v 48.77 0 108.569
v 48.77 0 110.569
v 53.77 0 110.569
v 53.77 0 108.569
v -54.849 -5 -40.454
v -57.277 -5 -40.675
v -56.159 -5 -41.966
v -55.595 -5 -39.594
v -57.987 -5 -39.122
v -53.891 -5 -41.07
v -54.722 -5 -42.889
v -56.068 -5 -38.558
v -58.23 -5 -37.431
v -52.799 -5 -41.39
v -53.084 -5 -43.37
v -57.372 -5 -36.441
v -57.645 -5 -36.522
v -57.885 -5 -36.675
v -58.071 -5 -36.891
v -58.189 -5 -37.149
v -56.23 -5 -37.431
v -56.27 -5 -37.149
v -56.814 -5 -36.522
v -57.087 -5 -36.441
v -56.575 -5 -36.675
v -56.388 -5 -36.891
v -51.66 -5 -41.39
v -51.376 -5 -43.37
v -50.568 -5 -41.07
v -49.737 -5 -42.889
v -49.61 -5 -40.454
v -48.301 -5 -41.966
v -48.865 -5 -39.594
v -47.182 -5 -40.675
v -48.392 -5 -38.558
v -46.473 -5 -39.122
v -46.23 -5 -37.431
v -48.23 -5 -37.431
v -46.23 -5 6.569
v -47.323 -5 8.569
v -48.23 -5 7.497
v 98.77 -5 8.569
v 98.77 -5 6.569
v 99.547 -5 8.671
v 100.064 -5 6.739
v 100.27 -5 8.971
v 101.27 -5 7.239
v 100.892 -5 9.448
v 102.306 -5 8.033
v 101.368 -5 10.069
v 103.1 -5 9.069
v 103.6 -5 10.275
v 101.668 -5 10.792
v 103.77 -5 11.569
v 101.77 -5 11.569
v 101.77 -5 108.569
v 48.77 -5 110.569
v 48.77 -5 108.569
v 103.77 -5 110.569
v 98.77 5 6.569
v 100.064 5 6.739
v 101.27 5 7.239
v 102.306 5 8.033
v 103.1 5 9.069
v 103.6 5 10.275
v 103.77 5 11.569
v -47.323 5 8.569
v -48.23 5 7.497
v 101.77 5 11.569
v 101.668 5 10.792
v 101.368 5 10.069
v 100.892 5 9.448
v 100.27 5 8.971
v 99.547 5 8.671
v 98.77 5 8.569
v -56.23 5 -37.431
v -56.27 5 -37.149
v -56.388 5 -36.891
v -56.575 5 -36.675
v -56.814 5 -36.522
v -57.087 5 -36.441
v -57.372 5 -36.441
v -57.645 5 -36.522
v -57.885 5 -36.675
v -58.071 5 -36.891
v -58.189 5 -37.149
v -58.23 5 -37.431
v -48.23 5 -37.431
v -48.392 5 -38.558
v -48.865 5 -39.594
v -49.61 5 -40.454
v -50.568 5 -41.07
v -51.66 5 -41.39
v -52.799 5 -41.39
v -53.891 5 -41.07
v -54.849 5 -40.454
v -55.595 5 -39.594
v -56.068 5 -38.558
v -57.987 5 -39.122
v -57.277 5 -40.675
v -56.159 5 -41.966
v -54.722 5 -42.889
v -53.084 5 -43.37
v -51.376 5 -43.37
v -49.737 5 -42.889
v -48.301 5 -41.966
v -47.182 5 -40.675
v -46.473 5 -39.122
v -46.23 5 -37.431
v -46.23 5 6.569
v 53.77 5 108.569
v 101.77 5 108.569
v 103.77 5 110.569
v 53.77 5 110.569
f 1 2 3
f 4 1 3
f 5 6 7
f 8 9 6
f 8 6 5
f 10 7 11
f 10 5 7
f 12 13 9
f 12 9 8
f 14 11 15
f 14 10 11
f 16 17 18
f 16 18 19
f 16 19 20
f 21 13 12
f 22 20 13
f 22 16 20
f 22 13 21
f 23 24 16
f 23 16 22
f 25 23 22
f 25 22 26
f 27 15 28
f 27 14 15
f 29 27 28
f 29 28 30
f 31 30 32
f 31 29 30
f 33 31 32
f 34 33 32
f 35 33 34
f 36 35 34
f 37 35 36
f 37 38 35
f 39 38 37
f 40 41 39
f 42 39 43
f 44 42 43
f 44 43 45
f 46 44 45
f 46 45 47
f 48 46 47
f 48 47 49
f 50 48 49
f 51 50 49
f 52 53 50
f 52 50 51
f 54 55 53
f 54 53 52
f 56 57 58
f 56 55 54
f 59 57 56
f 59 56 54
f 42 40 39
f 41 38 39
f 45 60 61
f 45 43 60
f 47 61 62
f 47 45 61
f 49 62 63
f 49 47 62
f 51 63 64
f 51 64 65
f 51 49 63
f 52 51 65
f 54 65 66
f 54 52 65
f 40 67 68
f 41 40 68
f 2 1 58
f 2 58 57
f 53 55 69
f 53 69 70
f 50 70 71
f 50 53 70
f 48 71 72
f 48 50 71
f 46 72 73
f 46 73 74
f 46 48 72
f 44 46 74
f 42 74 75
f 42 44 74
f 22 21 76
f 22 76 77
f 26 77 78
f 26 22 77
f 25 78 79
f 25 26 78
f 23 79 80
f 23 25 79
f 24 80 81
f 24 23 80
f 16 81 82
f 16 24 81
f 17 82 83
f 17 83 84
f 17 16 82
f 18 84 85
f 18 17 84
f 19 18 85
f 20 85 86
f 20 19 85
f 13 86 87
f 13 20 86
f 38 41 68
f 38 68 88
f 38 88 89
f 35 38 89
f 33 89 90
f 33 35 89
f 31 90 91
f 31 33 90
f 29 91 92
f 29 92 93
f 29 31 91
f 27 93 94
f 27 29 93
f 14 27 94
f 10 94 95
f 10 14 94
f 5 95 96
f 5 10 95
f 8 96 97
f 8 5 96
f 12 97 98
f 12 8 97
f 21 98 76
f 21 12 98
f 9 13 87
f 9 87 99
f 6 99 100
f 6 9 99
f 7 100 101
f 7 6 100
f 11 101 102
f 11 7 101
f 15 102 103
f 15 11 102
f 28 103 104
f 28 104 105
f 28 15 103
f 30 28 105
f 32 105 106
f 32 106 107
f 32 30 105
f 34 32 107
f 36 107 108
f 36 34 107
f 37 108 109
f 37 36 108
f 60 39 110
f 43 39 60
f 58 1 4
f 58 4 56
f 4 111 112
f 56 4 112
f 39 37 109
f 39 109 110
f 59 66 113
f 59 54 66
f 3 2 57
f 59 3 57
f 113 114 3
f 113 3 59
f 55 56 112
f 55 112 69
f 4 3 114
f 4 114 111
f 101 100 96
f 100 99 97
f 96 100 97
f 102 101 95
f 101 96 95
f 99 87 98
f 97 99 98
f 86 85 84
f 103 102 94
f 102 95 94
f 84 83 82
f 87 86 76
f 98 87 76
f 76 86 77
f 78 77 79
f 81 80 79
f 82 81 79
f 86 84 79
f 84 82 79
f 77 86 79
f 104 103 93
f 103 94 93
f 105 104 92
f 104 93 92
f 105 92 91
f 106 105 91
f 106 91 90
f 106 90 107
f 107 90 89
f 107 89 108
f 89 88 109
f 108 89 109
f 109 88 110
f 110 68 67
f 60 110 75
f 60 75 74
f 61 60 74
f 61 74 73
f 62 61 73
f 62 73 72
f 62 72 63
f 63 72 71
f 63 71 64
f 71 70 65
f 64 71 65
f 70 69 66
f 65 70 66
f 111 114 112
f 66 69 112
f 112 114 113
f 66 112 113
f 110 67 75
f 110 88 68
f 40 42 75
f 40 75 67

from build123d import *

# Parameters (mm, degrees)
F1_DEPTH = 5
F0_W     = 5
F0_H     = 2
F2_DEPTH = 5


# Not quite as in the source:
# - ends of sketch curves that miss each other by under 0.0002 mm in the source are joined


with BuildPart() as f1:
    # F0 (on Front) → F1 (new body, symmetric)
    with BuildSketch(Plane.XZ):
        with BuildLine():
            Line((103.7702985108, 110.5688567758), (53.7702985108, 110.5688567758))
            Line((53.7702985108, 110.5688567758), (53.7702985108, 108.5688567758))
            Line((53.7702985108, 108.5688567758), (101.7702985108, 108.5688567758))
            Line((101.7702985108, 108.5688567758), (101.7702985108, 11.5688567758))
            ThreePointArc((101.7702985108, 11.5688567758), (100.8916188543, 9.4475364322), (98.7702985108, 8.5688567758))
            Line((98.7702985108, 8.5688567758), (-47.322679311, 8.5688567758))
            Line((-47.322679311, 8.5688567758), (-48.2297014892, 7.4968221597))
            Line((-48.2297014892, 7.4968221597), (-48.2297014892, -37.4311432242))
            ThreePointArc((-48.2297014892, -37.4311432242), (-52.2297014892, -41.4311438799), (-56.2297021449, -37.4311432242))
            ThreePointArc((-56.2297021449, -37.4311432242), (-57.229701817, -36.4311435521), (-58.2297014892, -37.4311432242))
            ThreePointArc((-58.2297014892, -37.4311432242), (-52.2297014892, -43.4311432242), (-46.2297014892, -37.4311432242))
            Line((-46.2297014892, -37.4311432242), (-46.2297014892, 6.5688567758))
            Line((-46.2297014892, 6.5688567758), (98.7702985108, 6.5688567758))
            ThreePointArc((98.7702985108, 6.5688567758), (102.3058324167, 8.0333228698), (103.7702985108, 11.5688567758))
            Line((103.7702985108, 11.5688567758), (103.7702985108, 110.5688567758))
        make_face()
    extrude(amount=F1_DEPTH, both=True)

    # F0 (on Front) → F2 (join)
    with BuildSketch(Plane.XZ):
        with Locations((51.2702985108, 109.5688567758)):
            Rectangle(F0_W, F0_H)
    extrude(amount=F2_DEPTH)


solid = f1.part
